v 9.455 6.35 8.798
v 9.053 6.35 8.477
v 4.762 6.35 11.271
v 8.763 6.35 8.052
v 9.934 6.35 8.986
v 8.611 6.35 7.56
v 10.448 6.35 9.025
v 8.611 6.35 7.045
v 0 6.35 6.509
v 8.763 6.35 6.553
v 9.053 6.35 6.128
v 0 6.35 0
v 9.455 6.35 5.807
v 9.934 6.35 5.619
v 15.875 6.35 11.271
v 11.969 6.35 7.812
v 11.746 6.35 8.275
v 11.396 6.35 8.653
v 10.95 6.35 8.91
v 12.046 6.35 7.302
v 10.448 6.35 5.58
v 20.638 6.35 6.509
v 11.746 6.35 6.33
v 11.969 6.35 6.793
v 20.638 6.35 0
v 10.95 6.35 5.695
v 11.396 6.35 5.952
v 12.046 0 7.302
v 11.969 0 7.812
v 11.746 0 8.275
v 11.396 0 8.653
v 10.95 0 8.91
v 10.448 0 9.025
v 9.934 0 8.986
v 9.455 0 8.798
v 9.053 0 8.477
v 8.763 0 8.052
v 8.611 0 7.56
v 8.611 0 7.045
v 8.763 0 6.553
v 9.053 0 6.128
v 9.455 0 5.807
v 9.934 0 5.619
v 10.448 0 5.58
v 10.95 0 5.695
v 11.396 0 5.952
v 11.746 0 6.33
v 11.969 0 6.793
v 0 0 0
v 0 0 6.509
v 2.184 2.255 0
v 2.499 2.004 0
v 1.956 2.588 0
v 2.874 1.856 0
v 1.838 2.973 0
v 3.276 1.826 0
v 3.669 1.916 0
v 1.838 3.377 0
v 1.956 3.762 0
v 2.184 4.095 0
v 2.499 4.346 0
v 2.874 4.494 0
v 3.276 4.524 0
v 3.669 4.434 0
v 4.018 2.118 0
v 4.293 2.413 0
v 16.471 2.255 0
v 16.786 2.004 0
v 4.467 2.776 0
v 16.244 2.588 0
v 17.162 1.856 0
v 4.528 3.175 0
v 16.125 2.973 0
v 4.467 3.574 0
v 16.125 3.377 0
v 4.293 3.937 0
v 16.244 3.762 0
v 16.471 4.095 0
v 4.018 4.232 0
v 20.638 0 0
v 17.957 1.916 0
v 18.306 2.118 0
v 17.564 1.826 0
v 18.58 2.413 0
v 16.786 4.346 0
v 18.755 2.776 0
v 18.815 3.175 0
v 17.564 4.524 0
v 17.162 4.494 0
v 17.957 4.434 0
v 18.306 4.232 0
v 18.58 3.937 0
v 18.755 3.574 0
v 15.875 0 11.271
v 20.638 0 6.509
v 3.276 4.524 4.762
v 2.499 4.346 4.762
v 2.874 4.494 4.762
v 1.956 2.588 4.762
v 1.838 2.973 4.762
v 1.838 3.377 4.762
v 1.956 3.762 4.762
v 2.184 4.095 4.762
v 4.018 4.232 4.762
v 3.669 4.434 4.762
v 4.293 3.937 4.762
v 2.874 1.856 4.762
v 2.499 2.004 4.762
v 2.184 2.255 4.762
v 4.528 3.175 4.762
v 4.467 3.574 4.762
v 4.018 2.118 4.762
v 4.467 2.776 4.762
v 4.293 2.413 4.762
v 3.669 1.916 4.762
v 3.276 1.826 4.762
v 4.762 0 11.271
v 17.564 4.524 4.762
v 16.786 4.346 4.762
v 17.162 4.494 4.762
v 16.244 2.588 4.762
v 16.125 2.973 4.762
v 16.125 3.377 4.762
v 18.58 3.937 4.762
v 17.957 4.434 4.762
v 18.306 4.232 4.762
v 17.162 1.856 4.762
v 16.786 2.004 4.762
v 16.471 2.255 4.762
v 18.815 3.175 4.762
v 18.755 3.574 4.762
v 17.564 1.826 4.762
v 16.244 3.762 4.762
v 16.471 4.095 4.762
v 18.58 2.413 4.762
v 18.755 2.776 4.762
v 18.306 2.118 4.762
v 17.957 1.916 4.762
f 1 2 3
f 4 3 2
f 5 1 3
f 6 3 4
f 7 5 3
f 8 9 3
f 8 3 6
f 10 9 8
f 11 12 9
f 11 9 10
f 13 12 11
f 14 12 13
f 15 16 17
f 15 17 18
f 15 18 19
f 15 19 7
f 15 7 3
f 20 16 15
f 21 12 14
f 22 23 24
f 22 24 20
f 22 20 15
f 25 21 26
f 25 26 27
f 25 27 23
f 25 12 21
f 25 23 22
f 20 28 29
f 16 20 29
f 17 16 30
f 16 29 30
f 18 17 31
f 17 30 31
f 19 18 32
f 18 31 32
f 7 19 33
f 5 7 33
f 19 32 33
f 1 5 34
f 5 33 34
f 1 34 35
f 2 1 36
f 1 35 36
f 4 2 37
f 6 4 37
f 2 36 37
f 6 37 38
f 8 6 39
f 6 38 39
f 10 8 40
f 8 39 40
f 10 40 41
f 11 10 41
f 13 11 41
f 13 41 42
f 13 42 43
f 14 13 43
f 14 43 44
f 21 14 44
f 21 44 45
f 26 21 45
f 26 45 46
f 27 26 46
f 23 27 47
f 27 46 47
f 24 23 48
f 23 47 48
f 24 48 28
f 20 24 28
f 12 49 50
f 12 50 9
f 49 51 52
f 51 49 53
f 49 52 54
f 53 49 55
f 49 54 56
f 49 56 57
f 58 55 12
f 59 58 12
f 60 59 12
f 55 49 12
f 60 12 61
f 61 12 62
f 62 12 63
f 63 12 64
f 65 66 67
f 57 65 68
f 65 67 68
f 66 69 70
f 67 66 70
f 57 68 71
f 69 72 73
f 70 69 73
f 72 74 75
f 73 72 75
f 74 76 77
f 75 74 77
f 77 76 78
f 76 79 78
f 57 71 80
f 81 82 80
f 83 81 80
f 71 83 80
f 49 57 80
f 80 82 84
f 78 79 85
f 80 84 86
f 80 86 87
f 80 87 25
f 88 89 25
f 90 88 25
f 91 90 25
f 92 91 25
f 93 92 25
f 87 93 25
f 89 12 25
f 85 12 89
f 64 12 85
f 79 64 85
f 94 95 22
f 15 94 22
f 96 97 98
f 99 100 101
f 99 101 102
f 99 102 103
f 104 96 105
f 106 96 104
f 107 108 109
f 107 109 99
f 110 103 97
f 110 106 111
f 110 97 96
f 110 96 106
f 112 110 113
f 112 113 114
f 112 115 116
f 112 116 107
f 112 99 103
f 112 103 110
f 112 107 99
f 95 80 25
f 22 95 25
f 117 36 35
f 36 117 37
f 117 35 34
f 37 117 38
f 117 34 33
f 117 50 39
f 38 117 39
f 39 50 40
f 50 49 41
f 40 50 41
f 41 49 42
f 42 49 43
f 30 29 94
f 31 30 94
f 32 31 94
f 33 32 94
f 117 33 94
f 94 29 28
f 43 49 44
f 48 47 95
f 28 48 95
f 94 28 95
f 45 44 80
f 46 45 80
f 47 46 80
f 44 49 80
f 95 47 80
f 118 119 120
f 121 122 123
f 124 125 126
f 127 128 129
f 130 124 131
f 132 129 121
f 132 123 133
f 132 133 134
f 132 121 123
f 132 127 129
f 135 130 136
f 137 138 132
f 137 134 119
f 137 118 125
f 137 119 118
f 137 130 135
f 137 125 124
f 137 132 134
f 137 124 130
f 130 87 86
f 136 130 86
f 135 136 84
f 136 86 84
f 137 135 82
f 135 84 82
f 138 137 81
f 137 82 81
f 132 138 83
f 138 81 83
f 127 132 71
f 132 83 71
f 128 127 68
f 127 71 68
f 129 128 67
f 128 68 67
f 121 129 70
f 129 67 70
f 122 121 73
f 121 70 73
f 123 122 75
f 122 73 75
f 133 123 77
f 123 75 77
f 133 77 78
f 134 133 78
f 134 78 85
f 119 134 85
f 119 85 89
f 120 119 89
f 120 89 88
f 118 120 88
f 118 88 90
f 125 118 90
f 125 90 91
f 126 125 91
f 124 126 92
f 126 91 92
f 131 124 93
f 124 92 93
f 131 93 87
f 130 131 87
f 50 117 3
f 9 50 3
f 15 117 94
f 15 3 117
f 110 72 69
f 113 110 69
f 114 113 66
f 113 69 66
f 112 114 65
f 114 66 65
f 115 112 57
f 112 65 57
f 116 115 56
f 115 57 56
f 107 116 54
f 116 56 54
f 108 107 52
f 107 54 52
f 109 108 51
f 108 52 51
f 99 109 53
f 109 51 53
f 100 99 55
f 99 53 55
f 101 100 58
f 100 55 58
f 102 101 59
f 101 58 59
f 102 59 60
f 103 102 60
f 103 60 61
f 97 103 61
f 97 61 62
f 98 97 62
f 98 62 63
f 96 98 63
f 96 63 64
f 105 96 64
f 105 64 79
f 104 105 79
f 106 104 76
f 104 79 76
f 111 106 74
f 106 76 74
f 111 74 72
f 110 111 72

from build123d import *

# Parameters (mm, degrees)
F0_W     = 20.6375
F0_H     = 6.35
F1_DEPTH = 11.27125
F2_R     = 1.7272
F3_DEPTH = 6.35
F4_R     = 1.35255
F5_DEPTH = 4.7625
F6_SIZE  = 4.7625


with BuildPart() as f1:
    # F0 (on Top) → F1 (new body)
    with BuildSketch(Plane.XY):
        with Locations((10.31875, 3.175)):
            Rectangle(F0_W, F0_H)
    extrude(amount=F1_DEPTH)

    # F2 (on face) → F3 (cut, through all)
    with BuildSketch(Plane.XZ):
        with Locations((10.31875, 7.3025)):
            Circle(F2_R)
    extrude(amount=-F3_DEPTH, mode=Mode.SUBTRACT)

    # F4 (on face) → F5 (cut)
    with BuildSketch(Plane(origin=(0, 0, 0), x_dir=(1, 0, 0), z_dir=(0, 0, -1))):
        with Locations((3.175, -3.175)):
            Circle(F4_R)
        with Locations((17.4625, -3.175)):
            Circle(F4_R)
    extrude(amount=-F5_DEPTH, mode=Mode.SUBTRACT)

    # F6
    f6_edges = [f1.edges().sort_by_distance(p)[0] for p in [
        (0, 3.175, 11.27125),
        (20.6375, 3.175, 11.27125),
    ]]
    chamfer(f6_edges, length=F6_SIZE)


solid = f1.part
